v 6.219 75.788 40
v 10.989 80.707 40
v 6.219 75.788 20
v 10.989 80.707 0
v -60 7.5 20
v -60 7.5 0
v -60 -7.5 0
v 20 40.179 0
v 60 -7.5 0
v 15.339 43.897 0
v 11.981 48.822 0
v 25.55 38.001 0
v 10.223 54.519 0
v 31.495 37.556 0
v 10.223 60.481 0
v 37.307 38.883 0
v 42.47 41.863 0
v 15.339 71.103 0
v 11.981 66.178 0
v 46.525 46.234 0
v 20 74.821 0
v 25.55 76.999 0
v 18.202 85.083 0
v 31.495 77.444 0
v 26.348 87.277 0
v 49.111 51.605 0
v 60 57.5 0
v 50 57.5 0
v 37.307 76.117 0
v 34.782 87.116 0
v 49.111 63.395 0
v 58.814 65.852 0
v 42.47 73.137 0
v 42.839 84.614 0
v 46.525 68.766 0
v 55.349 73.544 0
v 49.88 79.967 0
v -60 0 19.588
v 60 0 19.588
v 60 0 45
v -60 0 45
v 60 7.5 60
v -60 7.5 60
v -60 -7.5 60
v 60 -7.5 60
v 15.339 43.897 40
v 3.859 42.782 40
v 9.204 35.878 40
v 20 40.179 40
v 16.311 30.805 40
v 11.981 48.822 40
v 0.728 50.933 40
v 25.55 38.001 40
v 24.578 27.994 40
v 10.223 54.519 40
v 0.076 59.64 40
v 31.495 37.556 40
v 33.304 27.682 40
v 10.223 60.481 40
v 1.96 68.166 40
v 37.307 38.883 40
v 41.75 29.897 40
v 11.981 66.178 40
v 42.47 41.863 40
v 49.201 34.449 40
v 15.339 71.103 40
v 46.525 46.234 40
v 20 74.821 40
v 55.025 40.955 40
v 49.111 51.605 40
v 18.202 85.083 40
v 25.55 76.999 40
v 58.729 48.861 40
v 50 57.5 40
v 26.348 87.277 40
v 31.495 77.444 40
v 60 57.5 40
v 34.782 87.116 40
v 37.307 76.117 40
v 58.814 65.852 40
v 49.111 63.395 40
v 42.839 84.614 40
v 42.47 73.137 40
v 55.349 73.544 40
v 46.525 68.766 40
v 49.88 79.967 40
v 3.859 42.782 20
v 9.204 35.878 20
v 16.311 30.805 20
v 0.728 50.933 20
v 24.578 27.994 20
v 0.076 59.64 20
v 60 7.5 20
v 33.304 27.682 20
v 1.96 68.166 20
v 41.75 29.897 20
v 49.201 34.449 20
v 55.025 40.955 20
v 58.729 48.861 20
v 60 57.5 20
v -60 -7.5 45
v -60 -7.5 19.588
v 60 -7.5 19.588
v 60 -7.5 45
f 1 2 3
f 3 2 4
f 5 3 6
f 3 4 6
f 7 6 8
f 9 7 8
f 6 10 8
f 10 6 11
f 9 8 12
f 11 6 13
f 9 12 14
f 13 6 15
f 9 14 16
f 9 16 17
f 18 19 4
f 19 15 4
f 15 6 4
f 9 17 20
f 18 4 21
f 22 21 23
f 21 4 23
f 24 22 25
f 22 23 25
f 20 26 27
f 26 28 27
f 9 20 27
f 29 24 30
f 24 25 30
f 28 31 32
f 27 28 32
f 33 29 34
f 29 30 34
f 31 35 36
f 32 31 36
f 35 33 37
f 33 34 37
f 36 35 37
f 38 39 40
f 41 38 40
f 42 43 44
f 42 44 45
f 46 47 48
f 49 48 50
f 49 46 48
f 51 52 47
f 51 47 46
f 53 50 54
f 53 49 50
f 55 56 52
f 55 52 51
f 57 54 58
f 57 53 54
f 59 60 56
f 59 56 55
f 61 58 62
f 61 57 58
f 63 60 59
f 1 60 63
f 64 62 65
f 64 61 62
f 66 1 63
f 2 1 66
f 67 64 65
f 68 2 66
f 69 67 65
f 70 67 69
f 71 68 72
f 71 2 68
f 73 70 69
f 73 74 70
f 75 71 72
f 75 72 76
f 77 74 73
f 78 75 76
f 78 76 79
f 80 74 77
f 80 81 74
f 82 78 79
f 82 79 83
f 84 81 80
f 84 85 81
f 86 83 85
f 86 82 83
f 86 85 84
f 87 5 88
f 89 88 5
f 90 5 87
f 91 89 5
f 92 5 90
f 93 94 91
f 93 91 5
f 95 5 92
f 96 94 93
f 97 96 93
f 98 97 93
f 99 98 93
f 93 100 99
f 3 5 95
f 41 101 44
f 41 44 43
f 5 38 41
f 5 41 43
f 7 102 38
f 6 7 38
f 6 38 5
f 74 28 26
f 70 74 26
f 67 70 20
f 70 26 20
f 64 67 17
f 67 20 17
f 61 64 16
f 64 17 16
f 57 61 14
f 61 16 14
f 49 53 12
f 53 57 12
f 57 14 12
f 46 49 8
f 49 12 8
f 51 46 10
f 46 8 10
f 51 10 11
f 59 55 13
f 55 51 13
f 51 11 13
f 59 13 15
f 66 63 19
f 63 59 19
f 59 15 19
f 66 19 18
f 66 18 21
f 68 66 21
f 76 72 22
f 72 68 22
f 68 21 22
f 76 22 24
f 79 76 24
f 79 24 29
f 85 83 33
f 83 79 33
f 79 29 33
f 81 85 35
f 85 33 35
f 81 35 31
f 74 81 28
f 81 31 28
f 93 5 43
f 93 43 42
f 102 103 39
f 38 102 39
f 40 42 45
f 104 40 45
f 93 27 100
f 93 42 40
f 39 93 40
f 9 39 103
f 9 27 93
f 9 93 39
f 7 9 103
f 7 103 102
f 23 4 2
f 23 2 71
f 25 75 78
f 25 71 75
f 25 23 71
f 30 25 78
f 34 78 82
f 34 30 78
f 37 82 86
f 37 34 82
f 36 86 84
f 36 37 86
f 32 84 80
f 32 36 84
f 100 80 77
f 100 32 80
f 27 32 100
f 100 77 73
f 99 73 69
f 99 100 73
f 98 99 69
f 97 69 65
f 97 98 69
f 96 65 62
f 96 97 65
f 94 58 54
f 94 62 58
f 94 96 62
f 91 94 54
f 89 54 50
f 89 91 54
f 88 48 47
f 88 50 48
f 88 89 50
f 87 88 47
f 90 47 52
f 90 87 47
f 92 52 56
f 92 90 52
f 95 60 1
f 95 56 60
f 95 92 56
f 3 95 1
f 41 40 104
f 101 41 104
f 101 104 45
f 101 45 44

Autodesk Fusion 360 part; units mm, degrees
sketch "Sketch1" plane through (0, 0, 0) normal (0, 0, 1) x (1, 0, 0)
  line L0 (60, -7.5) -> (-60, -7.5)
  line L1 (-60, -7.5) -> (-60, 7.5)
  line L2 (-60, 7.5) -> (60, 7.5)
  line L3 (60, 7.5) -> (60, -7.5)
  line L4 (60, 7.5) -> (60, 57.5)
  circle A0 centre (30, 57.5) radius 30
  circle A1 centre (30, 57.5) radius 20
  line L5 (10.9888, 80.7072) -> (-60, 7.5)
  dimension "d1" = 120
  dimension "d2" = 15
  dimension "d5" = 30
  dimension "d6" = 60
  dimension "d7" = 40
extrude "Extrude1" add sketch "Sketch1" along normal blind 40 contours A0 L5 picked at (10.8489, 75.8663)
extrude "Extrude2" add sketch "Sketch1" along normal blind 20 contours L2 L4 A0 L5
extrude "Extrude3" add sketch "Sketch1" along normal blind 60 contours L0 L1 L2 L3
sketch "Sketch2" plane through (-60, 0, 0) normal (-1, 0, 0) x (0, -1, 0)
  line L0 (-7.5, 0) -> (7.5, 0)
  line L1 (7.5, 0) -> (7.5, 60)
  line L2 (7.5, 60) -> (-7.5, 60)
  line L3 (-7.5, 60) -> (-7.5, 20)
  line L4 (-7.5, 20) -> (-7.5, 0)
  line L5 (7.5, 19.588) -> (0, 19.588)
  line L6 (0, 19.588) -> (0, 45)
  line L7 (0, 45) -> (7.5, 45)
  line L8 (7.5, 45) -> (7.5, 19.588)
extrude "Extrude4" cut sketch "Sketch2" against normal blind 120 contours L1 L5 L6 L7 L8
